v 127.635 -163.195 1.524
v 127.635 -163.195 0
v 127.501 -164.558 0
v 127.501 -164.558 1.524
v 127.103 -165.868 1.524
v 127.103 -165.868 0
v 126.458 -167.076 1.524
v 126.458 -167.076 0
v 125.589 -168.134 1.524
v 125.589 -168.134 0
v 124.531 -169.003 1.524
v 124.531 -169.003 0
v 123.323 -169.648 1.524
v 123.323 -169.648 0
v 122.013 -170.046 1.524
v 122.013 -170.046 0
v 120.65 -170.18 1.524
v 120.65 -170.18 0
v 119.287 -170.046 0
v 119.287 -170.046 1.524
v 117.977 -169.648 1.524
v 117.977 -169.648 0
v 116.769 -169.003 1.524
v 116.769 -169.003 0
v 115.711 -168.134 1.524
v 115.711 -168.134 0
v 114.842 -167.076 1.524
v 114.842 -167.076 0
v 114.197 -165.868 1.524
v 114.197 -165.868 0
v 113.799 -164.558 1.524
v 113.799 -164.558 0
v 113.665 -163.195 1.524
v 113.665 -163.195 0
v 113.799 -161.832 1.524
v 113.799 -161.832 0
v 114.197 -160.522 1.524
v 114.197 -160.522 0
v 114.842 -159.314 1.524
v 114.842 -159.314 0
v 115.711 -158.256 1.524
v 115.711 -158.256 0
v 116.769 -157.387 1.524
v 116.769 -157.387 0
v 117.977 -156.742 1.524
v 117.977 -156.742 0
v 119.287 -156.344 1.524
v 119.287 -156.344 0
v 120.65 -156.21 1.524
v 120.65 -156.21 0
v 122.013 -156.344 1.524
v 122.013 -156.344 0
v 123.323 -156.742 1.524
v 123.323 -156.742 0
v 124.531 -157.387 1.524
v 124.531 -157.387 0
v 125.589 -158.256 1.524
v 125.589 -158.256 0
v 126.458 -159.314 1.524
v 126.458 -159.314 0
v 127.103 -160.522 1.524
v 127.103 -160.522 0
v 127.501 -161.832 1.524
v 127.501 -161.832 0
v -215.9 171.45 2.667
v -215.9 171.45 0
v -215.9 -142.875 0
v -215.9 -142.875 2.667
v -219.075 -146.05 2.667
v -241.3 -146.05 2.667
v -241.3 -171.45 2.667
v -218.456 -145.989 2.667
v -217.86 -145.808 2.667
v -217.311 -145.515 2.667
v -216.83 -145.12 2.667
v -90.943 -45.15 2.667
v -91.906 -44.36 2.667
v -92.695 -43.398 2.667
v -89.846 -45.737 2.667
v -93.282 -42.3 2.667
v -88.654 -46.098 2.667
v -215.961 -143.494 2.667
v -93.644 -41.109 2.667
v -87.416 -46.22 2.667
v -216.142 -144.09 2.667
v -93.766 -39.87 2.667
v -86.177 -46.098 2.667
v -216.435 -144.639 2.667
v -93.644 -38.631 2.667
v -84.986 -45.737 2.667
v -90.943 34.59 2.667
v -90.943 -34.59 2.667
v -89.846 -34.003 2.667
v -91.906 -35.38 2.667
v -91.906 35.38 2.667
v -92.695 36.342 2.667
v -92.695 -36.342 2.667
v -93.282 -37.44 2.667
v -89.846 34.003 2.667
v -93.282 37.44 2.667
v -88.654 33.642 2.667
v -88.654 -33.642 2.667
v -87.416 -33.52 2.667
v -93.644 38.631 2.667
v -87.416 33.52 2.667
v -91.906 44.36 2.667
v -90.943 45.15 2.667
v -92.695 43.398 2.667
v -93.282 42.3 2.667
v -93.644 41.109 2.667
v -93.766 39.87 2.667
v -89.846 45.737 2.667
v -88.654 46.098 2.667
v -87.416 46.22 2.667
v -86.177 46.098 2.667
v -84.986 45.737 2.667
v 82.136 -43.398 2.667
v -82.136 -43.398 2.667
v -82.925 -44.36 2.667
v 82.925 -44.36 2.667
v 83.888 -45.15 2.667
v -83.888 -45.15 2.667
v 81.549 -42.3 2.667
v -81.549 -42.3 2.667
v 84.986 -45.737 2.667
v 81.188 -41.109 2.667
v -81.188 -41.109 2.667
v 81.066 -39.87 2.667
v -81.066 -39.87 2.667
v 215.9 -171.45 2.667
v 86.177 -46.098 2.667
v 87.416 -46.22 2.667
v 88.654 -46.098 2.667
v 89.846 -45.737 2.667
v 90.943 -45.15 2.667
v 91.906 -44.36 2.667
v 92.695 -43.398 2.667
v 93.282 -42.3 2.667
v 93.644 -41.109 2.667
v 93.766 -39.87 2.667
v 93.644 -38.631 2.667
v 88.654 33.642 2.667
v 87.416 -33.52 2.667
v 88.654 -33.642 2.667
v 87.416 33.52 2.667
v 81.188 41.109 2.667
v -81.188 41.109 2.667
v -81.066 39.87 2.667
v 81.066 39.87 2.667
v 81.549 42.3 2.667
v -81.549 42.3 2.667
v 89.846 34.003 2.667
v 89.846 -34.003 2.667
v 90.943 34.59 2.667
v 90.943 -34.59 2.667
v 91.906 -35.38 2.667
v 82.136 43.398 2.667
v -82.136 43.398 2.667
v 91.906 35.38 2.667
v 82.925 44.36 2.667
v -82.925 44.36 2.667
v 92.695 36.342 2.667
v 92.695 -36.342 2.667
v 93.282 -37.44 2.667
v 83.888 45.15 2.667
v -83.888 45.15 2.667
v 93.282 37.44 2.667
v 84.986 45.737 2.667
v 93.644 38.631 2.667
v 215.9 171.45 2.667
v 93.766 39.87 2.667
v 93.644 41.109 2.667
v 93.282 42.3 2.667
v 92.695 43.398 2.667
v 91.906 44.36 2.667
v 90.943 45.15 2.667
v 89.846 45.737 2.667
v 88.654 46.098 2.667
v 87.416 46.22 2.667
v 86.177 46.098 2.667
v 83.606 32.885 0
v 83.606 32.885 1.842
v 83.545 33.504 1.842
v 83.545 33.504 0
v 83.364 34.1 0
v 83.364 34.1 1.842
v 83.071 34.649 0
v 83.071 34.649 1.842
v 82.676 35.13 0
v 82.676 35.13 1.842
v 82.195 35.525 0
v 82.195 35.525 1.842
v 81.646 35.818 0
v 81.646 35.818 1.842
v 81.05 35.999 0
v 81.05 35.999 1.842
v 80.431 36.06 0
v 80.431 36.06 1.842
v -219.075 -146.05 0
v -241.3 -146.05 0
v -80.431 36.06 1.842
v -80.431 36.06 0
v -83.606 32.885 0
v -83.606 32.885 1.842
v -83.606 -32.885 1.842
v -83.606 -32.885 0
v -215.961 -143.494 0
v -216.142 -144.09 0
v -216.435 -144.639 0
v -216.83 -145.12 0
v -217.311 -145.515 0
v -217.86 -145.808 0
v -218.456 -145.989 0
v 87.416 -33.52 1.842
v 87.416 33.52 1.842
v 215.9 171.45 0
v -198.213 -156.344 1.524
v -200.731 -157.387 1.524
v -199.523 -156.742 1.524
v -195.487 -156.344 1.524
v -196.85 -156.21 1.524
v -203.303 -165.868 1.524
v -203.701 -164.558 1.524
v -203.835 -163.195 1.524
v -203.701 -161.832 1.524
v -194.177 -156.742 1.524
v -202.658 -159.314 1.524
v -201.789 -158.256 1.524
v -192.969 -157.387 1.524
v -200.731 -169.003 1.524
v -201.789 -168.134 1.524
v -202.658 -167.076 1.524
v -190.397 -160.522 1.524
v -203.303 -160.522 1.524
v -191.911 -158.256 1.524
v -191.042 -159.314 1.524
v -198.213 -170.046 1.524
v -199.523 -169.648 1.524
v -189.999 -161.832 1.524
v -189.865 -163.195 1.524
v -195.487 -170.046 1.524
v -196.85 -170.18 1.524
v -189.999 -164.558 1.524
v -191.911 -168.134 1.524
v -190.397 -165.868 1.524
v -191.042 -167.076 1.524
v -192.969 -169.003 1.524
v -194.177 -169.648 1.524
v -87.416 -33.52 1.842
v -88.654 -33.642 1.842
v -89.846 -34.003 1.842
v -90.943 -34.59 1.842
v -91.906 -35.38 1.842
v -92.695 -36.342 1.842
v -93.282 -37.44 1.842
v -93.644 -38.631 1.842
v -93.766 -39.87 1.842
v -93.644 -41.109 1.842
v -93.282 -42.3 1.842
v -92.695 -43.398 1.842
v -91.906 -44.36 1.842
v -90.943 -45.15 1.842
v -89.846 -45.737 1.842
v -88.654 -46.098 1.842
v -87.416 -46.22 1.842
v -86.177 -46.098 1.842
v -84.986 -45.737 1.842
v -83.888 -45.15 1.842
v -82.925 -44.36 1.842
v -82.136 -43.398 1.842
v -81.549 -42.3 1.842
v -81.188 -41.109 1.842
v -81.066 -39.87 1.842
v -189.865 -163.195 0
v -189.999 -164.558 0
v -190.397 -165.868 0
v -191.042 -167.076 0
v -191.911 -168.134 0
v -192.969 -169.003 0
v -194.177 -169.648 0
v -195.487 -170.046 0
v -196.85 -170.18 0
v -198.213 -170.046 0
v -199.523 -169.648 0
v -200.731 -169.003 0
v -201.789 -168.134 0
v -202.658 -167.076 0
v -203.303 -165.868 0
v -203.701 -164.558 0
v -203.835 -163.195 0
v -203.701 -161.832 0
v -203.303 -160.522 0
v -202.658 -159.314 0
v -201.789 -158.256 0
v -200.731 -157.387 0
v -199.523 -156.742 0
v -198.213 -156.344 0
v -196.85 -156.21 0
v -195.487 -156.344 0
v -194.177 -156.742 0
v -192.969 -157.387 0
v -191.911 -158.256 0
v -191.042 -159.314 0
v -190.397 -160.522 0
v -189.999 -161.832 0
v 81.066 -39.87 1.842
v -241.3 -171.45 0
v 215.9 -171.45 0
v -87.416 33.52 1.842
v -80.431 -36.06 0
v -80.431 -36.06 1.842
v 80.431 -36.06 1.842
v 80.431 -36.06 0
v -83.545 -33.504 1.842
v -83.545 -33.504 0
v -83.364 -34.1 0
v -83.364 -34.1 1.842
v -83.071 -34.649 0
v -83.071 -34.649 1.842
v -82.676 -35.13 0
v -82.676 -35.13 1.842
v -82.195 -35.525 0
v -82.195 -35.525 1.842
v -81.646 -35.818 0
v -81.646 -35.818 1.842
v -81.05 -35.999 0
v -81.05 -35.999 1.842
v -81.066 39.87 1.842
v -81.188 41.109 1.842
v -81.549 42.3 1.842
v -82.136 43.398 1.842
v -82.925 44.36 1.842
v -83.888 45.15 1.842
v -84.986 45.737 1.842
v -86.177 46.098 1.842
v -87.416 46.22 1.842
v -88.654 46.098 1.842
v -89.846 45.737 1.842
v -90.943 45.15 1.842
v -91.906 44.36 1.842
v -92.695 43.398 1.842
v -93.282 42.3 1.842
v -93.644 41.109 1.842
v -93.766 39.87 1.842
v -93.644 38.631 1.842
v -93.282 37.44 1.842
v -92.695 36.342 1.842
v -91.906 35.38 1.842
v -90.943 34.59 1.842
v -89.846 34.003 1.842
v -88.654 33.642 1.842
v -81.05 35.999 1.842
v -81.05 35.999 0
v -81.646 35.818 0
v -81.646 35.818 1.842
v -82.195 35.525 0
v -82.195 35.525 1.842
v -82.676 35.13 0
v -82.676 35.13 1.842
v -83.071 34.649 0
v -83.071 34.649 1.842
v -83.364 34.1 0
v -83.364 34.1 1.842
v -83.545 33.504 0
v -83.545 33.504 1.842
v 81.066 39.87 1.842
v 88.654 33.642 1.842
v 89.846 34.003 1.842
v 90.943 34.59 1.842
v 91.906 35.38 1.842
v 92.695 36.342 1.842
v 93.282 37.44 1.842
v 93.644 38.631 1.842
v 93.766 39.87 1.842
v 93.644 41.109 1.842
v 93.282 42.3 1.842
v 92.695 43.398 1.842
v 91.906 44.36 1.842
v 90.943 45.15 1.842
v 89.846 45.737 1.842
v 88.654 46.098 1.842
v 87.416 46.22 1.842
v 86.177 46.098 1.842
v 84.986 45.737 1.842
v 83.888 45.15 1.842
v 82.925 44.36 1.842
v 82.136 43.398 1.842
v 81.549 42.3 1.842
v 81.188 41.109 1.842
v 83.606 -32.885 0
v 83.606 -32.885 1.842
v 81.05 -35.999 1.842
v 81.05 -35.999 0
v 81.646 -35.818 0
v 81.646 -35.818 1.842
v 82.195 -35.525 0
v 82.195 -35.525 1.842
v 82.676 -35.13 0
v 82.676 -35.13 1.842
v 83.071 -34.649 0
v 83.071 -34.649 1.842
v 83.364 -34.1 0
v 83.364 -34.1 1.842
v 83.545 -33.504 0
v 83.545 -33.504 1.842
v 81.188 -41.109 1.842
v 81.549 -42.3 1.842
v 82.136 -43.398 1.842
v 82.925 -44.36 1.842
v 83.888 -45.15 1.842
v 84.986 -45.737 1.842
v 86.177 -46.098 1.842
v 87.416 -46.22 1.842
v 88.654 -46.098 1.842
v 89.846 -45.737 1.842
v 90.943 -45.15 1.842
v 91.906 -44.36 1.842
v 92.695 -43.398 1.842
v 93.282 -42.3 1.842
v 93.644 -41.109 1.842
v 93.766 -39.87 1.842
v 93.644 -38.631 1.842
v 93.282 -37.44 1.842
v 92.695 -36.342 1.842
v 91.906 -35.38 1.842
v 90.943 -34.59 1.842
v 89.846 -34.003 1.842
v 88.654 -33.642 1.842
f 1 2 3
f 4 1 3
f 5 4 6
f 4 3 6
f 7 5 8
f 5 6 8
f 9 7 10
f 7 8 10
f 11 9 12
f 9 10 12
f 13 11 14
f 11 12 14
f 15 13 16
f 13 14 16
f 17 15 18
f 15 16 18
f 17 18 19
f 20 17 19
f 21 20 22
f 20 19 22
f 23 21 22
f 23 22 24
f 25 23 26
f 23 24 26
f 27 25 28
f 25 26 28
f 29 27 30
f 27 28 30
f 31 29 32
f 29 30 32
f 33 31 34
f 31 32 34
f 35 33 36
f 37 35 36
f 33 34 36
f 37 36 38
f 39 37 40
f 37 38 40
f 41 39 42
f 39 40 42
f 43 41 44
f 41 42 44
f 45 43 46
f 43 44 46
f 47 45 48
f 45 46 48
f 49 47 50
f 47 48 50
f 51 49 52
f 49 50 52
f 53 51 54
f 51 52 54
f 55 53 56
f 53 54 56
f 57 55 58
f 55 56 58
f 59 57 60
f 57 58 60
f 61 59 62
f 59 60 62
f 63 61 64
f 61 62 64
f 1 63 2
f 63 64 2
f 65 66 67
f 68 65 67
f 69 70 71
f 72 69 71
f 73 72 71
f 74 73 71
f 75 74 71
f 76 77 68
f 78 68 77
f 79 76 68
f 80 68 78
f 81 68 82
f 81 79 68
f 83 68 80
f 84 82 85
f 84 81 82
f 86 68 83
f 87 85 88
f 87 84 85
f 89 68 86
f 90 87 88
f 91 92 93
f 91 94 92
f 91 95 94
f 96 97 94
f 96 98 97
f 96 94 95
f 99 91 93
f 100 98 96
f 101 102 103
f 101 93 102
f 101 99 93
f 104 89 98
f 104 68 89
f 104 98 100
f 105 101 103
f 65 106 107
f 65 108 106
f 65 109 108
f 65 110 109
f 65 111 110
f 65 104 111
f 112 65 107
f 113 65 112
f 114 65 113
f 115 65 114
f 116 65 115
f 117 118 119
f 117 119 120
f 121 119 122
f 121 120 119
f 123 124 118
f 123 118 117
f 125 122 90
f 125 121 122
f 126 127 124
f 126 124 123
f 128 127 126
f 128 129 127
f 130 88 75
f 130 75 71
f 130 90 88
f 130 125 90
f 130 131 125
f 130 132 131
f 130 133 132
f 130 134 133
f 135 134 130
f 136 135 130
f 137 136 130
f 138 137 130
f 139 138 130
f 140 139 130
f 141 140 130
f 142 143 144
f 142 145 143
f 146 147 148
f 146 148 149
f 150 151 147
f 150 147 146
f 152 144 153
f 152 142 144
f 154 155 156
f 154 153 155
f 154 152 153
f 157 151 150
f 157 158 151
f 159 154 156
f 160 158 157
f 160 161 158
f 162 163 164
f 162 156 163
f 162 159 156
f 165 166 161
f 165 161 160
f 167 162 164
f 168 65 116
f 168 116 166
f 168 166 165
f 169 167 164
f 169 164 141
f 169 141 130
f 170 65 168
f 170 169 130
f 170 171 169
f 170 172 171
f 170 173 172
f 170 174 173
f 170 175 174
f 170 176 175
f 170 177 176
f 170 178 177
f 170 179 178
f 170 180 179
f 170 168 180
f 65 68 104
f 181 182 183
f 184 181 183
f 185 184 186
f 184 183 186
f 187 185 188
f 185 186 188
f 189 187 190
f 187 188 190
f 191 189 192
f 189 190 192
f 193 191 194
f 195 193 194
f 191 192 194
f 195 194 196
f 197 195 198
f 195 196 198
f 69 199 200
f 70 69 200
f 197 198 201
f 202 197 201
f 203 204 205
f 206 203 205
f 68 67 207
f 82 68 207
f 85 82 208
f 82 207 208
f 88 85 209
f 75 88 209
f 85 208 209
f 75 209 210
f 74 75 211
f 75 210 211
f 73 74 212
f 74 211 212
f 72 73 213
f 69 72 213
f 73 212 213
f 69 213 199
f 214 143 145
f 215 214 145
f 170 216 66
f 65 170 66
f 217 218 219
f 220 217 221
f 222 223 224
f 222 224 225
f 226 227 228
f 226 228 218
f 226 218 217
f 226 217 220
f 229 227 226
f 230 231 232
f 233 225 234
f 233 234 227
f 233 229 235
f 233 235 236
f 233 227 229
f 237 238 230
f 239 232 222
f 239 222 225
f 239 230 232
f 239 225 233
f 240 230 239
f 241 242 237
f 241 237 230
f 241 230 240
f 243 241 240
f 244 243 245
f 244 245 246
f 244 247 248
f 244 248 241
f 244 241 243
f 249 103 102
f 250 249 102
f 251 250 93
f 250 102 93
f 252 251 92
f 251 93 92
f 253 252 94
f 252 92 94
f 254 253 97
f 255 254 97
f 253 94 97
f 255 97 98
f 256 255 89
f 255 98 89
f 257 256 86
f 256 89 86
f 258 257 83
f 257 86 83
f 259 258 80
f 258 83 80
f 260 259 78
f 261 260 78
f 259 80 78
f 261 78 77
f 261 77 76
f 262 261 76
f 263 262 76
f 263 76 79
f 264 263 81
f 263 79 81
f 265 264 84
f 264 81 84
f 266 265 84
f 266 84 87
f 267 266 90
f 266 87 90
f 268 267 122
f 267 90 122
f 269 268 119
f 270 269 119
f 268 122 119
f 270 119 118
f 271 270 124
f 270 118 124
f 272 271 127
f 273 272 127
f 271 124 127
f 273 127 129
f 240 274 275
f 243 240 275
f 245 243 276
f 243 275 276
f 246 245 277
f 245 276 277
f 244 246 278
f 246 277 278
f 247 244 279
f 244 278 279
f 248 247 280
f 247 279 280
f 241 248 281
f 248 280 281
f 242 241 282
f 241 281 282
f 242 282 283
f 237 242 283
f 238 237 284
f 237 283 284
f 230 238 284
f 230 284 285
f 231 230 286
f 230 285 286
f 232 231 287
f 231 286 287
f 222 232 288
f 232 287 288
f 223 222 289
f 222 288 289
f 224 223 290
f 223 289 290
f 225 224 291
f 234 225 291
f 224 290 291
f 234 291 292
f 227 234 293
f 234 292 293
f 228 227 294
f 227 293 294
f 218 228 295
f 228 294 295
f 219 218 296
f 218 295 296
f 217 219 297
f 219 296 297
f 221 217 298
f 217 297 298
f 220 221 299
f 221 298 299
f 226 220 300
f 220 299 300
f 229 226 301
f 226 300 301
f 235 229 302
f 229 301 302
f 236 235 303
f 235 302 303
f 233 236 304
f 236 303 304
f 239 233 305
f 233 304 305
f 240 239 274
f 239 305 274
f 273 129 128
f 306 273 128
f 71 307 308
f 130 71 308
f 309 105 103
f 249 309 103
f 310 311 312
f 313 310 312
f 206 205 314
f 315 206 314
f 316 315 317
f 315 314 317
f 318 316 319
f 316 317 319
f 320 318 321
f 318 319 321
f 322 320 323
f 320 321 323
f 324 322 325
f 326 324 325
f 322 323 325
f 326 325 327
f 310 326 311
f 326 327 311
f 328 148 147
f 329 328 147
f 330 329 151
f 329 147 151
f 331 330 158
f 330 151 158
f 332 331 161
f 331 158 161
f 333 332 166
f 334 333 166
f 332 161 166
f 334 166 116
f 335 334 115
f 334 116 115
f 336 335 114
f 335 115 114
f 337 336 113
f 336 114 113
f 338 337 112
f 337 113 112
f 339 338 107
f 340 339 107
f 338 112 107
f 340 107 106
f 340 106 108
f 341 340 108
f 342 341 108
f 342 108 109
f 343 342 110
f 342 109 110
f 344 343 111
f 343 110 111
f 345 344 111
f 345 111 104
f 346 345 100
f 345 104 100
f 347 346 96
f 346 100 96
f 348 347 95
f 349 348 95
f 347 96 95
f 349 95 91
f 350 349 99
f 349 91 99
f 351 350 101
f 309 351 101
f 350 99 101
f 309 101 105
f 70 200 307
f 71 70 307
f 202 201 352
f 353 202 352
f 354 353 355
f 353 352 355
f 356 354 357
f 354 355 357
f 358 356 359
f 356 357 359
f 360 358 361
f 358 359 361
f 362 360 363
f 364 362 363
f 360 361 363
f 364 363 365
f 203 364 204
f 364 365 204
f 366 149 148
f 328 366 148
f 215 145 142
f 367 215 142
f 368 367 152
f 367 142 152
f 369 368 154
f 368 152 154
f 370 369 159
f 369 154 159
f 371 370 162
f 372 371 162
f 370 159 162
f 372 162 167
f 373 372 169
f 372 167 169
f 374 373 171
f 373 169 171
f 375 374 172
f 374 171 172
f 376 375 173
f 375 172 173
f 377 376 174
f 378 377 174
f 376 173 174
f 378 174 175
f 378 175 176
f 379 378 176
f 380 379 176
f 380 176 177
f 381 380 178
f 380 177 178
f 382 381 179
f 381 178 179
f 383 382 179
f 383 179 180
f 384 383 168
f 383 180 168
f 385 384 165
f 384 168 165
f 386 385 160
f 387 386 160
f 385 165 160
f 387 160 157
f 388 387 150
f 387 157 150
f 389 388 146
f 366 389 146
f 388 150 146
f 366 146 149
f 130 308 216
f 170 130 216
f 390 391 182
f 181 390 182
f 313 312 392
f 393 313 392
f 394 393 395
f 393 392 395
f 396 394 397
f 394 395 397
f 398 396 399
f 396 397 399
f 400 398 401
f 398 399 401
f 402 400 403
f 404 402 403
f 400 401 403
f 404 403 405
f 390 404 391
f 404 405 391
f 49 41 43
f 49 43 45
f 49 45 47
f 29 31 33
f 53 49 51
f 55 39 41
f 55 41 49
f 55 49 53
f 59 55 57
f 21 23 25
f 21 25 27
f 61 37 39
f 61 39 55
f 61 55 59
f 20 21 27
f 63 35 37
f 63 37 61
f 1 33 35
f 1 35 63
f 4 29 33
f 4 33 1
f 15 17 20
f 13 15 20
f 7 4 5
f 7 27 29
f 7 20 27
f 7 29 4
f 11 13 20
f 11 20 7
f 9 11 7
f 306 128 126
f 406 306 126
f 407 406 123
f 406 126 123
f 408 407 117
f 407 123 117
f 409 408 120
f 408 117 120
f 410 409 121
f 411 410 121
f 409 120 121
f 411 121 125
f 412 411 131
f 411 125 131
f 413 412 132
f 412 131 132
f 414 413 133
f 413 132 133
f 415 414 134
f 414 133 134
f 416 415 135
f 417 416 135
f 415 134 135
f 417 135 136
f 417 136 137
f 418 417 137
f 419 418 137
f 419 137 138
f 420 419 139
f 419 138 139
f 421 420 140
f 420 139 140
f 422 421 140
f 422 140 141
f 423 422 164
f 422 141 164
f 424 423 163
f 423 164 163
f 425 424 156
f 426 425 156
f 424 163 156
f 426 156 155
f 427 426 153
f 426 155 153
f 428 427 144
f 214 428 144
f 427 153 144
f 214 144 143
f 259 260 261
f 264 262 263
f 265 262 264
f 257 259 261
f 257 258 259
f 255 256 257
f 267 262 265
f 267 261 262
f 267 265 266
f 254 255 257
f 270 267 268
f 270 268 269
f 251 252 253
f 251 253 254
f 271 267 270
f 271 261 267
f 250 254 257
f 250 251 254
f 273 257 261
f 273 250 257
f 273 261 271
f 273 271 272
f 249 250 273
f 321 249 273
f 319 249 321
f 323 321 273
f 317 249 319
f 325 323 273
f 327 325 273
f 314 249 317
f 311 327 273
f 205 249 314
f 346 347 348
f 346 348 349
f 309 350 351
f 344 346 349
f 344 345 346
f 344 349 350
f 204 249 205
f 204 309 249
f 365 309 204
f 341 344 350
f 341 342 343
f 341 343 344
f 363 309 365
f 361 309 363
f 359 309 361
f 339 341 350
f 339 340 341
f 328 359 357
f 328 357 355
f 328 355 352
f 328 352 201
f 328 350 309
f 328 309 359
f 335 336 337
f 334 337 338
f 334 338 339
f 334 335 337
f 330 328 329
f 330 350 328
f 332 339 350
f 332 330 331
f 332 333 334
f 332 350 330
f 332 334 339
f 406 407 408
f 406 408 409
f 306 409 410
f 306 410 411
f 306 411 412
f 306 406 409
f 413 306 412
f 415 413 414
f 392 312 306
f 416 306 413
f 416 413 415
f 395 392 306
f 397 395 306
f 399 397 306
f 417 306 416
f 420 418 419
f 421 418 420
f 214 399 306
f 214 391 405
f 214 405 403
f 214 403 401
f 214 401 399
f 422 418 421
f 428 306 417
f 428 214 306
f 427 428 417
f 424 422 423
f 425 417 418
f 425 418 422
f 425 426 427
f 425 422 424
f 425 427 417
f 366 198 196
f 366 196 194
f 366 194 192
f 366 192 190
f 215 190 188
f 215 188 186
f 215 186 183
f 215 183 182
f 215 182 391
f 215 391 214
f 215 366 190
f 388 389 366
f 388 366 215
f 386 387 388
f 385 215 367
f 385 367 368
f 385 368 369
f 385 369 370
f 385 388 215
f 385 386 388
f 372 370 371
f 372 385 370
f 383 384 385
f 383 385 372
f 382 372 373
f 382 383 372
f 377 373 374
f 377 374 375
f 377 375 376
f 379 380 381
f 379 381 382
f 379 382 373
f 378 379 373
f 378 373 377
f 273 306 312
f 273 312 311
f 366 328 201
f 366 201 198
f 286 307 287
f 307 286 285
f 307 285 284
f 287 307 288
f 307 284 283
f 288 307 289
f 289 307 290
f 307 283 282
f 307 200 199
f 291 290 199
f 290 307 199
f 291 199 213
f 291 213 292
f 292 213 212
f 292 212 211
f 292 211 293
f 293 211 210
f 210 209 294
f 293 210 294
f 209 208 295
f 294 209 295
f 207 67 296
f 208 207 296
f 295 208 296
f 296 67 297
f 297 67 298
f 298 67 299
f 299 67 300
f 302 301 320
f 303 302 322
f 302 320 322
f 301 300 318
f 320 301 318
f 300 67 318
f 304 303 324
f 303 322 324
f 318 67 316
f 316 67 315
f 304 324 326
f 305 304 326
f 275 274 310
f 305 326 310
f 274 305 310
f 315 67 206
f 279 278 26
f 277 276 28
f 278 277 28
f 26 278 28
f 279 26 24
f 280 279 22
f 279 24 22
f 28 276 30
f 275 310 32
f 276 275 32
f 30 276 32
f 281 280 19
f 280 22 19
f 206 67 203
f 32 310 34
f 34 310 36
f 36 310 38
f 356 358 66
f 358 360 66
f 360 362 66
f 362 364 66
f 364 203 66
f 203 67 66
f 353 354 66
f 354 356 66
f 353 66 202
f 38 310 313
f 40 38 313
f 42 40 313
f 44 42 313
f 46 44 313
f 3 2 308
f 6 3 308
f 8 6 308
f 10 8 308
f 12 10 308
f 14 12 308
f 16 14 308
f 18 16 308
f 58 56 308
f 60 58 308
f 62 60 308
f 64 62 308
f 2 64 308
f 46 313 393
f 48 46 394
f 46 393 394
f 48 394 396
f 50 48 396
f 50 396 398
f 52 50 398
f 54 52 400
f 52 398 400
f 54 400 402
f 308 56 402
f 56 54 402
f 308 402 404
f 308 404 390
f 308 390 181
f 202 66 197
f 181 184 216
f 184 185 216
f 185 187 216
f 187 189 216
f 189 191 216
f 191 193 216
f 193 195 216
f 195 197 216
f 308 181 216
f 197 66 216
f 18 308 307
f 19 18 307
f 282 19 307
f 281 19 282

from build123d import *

# Parameters (mm, degrees)
F1_DEPTH = 2.667
F2_R     = 6.985
F3_DEPTH = 1.524
F5_DEPTH = 0.8255
F7_DEPTH = 2.668


with BuildPart() as f1:
    # F0 (on Top) → F1 (new body)
    with BuildSketch(Plane.XY):
        with BuildLine():
            Line((215.9, 171.45), (-215.9, 171.45))
            Line((-215.9, 171.45), (-215.9, -142.875))
            ThreePointArc((-215.9, -142.875), (-216.829936, -145.120064), (-219.075, -146.05))
            Line((-219.075, -146.05), (-241.3, -146.05))
            Line((-241.3, -146.05), (-241.3, -171.45))
            Line((-241.3, -171.45), (215.9, -171.45))
            Line((215.9, -171.45), (215.9, 171.45))
        make_face()
    extrude(amount=F1_DEPTH)

    # F2 (on face) → F3 (cut)
    with BuildSketch(Plane(origin=(0, 0, 0), x_dir=(1, 0, 0), z_dir=(0, 0, -1))):
        with Locations((-196.85, 163.195)):
            Circle(F2_R)
        with Locations((120.65, 163.195)):
            Circle(F2_R)
    extrude(amount=-F3_DEPTH, mode=Mode.SUBTRACT)

    # F4 (on face) → F5 (cut)
    with BuildSketch(Plane.XY.offset(2.667)):
        with BuildLine():
            Line((-81.065625, -39.87), (81.065625, -39.87))
            ThreePointArc((81.065625, -39.87), (91.905753, -44.360128), (87.415625, -33.52))
            Line((87.415625, -33.52), (87.415625, 33.52))
            ThreePointArc((87.415625, 33.52), (91.905753, 44.360128), (81.065625, 39.87))
            Line((81.065625, 39.87), (-81.065625, 39.87))
            ThreePointArc((-81.065625, 39.87), (-91.905753, 44.360128), (-87.415625, 33.52))
            Line((-87.415625, 33.52), (-87.415625, -33.52))
            ThreePointArc((-87.415625, -33.52), (-91.905753, -44.360128), (-81.065625, -39.87))
        make_face()
        with BuildLine():
            Line((-80.430625, 36.06), (80.430625, 36.06))
            ThreePointArc((80.430625, 36.06), (82.675689, 35.130064), (83.605625, 32.885))
            Line((83.605625, 32.885), (83.605625, -32.885))
            ThreePointArc((83.605625, -32.885), (82.675689, -35.130064), (80.430625, -36.06))
            Line((80.430625, -36.06), (-80.430625, -36.06))
            ThreePointArc((-80.430625, -36.06), (-82.675689, -35.130064), (-83.605625, -32.885))
            Line((-83.605625, -32.885), (-83.605625, 32.885))
            ThreePointArc((-83.605625, 32.885), (-82.675689, 35.130064), (-80.430625, 36.06))
        make_face(mode=Mode.SUBTRACT)
    extrude(amount=-F5_DEPTH, mode=Mode.SUBTRACT)

    # F6 (on face) → F7 (cut, through all)
    with BuildSketch(Plane.XY.offset(2.667)):
        with BuildLine():
            Line((83.605625, -32.885), (83.605625, 32.885))
            ThreePointArc((83.605625, 32.885), (82.675689, 35.130064), (80.430625, 36.06))
            Line((80.430625, 36.06), (-80.430625, 36.06))
            ThreePointArc((-80.430625, 36.06), (-82.675689, 35.130064), (-83.605625, 32.885))
            Line((-83.605625, 32.885), (-83.605625, -32.885))
            ThreePointArc((-83.605625, -32.885), (-82.675689, -35.130064), (-80.430625, -36.06))
            Line((-80.430625, -36.06), (80.430625, -36.06))
            ThreePointArc((80.430625, -36.06), (82.675689, -35.130064), (83.605625, -32.885))
        make_face()
    extrude(amount=-F7_DEPTH, mode=Mode.SUBTRACT)


solid = f1.part
